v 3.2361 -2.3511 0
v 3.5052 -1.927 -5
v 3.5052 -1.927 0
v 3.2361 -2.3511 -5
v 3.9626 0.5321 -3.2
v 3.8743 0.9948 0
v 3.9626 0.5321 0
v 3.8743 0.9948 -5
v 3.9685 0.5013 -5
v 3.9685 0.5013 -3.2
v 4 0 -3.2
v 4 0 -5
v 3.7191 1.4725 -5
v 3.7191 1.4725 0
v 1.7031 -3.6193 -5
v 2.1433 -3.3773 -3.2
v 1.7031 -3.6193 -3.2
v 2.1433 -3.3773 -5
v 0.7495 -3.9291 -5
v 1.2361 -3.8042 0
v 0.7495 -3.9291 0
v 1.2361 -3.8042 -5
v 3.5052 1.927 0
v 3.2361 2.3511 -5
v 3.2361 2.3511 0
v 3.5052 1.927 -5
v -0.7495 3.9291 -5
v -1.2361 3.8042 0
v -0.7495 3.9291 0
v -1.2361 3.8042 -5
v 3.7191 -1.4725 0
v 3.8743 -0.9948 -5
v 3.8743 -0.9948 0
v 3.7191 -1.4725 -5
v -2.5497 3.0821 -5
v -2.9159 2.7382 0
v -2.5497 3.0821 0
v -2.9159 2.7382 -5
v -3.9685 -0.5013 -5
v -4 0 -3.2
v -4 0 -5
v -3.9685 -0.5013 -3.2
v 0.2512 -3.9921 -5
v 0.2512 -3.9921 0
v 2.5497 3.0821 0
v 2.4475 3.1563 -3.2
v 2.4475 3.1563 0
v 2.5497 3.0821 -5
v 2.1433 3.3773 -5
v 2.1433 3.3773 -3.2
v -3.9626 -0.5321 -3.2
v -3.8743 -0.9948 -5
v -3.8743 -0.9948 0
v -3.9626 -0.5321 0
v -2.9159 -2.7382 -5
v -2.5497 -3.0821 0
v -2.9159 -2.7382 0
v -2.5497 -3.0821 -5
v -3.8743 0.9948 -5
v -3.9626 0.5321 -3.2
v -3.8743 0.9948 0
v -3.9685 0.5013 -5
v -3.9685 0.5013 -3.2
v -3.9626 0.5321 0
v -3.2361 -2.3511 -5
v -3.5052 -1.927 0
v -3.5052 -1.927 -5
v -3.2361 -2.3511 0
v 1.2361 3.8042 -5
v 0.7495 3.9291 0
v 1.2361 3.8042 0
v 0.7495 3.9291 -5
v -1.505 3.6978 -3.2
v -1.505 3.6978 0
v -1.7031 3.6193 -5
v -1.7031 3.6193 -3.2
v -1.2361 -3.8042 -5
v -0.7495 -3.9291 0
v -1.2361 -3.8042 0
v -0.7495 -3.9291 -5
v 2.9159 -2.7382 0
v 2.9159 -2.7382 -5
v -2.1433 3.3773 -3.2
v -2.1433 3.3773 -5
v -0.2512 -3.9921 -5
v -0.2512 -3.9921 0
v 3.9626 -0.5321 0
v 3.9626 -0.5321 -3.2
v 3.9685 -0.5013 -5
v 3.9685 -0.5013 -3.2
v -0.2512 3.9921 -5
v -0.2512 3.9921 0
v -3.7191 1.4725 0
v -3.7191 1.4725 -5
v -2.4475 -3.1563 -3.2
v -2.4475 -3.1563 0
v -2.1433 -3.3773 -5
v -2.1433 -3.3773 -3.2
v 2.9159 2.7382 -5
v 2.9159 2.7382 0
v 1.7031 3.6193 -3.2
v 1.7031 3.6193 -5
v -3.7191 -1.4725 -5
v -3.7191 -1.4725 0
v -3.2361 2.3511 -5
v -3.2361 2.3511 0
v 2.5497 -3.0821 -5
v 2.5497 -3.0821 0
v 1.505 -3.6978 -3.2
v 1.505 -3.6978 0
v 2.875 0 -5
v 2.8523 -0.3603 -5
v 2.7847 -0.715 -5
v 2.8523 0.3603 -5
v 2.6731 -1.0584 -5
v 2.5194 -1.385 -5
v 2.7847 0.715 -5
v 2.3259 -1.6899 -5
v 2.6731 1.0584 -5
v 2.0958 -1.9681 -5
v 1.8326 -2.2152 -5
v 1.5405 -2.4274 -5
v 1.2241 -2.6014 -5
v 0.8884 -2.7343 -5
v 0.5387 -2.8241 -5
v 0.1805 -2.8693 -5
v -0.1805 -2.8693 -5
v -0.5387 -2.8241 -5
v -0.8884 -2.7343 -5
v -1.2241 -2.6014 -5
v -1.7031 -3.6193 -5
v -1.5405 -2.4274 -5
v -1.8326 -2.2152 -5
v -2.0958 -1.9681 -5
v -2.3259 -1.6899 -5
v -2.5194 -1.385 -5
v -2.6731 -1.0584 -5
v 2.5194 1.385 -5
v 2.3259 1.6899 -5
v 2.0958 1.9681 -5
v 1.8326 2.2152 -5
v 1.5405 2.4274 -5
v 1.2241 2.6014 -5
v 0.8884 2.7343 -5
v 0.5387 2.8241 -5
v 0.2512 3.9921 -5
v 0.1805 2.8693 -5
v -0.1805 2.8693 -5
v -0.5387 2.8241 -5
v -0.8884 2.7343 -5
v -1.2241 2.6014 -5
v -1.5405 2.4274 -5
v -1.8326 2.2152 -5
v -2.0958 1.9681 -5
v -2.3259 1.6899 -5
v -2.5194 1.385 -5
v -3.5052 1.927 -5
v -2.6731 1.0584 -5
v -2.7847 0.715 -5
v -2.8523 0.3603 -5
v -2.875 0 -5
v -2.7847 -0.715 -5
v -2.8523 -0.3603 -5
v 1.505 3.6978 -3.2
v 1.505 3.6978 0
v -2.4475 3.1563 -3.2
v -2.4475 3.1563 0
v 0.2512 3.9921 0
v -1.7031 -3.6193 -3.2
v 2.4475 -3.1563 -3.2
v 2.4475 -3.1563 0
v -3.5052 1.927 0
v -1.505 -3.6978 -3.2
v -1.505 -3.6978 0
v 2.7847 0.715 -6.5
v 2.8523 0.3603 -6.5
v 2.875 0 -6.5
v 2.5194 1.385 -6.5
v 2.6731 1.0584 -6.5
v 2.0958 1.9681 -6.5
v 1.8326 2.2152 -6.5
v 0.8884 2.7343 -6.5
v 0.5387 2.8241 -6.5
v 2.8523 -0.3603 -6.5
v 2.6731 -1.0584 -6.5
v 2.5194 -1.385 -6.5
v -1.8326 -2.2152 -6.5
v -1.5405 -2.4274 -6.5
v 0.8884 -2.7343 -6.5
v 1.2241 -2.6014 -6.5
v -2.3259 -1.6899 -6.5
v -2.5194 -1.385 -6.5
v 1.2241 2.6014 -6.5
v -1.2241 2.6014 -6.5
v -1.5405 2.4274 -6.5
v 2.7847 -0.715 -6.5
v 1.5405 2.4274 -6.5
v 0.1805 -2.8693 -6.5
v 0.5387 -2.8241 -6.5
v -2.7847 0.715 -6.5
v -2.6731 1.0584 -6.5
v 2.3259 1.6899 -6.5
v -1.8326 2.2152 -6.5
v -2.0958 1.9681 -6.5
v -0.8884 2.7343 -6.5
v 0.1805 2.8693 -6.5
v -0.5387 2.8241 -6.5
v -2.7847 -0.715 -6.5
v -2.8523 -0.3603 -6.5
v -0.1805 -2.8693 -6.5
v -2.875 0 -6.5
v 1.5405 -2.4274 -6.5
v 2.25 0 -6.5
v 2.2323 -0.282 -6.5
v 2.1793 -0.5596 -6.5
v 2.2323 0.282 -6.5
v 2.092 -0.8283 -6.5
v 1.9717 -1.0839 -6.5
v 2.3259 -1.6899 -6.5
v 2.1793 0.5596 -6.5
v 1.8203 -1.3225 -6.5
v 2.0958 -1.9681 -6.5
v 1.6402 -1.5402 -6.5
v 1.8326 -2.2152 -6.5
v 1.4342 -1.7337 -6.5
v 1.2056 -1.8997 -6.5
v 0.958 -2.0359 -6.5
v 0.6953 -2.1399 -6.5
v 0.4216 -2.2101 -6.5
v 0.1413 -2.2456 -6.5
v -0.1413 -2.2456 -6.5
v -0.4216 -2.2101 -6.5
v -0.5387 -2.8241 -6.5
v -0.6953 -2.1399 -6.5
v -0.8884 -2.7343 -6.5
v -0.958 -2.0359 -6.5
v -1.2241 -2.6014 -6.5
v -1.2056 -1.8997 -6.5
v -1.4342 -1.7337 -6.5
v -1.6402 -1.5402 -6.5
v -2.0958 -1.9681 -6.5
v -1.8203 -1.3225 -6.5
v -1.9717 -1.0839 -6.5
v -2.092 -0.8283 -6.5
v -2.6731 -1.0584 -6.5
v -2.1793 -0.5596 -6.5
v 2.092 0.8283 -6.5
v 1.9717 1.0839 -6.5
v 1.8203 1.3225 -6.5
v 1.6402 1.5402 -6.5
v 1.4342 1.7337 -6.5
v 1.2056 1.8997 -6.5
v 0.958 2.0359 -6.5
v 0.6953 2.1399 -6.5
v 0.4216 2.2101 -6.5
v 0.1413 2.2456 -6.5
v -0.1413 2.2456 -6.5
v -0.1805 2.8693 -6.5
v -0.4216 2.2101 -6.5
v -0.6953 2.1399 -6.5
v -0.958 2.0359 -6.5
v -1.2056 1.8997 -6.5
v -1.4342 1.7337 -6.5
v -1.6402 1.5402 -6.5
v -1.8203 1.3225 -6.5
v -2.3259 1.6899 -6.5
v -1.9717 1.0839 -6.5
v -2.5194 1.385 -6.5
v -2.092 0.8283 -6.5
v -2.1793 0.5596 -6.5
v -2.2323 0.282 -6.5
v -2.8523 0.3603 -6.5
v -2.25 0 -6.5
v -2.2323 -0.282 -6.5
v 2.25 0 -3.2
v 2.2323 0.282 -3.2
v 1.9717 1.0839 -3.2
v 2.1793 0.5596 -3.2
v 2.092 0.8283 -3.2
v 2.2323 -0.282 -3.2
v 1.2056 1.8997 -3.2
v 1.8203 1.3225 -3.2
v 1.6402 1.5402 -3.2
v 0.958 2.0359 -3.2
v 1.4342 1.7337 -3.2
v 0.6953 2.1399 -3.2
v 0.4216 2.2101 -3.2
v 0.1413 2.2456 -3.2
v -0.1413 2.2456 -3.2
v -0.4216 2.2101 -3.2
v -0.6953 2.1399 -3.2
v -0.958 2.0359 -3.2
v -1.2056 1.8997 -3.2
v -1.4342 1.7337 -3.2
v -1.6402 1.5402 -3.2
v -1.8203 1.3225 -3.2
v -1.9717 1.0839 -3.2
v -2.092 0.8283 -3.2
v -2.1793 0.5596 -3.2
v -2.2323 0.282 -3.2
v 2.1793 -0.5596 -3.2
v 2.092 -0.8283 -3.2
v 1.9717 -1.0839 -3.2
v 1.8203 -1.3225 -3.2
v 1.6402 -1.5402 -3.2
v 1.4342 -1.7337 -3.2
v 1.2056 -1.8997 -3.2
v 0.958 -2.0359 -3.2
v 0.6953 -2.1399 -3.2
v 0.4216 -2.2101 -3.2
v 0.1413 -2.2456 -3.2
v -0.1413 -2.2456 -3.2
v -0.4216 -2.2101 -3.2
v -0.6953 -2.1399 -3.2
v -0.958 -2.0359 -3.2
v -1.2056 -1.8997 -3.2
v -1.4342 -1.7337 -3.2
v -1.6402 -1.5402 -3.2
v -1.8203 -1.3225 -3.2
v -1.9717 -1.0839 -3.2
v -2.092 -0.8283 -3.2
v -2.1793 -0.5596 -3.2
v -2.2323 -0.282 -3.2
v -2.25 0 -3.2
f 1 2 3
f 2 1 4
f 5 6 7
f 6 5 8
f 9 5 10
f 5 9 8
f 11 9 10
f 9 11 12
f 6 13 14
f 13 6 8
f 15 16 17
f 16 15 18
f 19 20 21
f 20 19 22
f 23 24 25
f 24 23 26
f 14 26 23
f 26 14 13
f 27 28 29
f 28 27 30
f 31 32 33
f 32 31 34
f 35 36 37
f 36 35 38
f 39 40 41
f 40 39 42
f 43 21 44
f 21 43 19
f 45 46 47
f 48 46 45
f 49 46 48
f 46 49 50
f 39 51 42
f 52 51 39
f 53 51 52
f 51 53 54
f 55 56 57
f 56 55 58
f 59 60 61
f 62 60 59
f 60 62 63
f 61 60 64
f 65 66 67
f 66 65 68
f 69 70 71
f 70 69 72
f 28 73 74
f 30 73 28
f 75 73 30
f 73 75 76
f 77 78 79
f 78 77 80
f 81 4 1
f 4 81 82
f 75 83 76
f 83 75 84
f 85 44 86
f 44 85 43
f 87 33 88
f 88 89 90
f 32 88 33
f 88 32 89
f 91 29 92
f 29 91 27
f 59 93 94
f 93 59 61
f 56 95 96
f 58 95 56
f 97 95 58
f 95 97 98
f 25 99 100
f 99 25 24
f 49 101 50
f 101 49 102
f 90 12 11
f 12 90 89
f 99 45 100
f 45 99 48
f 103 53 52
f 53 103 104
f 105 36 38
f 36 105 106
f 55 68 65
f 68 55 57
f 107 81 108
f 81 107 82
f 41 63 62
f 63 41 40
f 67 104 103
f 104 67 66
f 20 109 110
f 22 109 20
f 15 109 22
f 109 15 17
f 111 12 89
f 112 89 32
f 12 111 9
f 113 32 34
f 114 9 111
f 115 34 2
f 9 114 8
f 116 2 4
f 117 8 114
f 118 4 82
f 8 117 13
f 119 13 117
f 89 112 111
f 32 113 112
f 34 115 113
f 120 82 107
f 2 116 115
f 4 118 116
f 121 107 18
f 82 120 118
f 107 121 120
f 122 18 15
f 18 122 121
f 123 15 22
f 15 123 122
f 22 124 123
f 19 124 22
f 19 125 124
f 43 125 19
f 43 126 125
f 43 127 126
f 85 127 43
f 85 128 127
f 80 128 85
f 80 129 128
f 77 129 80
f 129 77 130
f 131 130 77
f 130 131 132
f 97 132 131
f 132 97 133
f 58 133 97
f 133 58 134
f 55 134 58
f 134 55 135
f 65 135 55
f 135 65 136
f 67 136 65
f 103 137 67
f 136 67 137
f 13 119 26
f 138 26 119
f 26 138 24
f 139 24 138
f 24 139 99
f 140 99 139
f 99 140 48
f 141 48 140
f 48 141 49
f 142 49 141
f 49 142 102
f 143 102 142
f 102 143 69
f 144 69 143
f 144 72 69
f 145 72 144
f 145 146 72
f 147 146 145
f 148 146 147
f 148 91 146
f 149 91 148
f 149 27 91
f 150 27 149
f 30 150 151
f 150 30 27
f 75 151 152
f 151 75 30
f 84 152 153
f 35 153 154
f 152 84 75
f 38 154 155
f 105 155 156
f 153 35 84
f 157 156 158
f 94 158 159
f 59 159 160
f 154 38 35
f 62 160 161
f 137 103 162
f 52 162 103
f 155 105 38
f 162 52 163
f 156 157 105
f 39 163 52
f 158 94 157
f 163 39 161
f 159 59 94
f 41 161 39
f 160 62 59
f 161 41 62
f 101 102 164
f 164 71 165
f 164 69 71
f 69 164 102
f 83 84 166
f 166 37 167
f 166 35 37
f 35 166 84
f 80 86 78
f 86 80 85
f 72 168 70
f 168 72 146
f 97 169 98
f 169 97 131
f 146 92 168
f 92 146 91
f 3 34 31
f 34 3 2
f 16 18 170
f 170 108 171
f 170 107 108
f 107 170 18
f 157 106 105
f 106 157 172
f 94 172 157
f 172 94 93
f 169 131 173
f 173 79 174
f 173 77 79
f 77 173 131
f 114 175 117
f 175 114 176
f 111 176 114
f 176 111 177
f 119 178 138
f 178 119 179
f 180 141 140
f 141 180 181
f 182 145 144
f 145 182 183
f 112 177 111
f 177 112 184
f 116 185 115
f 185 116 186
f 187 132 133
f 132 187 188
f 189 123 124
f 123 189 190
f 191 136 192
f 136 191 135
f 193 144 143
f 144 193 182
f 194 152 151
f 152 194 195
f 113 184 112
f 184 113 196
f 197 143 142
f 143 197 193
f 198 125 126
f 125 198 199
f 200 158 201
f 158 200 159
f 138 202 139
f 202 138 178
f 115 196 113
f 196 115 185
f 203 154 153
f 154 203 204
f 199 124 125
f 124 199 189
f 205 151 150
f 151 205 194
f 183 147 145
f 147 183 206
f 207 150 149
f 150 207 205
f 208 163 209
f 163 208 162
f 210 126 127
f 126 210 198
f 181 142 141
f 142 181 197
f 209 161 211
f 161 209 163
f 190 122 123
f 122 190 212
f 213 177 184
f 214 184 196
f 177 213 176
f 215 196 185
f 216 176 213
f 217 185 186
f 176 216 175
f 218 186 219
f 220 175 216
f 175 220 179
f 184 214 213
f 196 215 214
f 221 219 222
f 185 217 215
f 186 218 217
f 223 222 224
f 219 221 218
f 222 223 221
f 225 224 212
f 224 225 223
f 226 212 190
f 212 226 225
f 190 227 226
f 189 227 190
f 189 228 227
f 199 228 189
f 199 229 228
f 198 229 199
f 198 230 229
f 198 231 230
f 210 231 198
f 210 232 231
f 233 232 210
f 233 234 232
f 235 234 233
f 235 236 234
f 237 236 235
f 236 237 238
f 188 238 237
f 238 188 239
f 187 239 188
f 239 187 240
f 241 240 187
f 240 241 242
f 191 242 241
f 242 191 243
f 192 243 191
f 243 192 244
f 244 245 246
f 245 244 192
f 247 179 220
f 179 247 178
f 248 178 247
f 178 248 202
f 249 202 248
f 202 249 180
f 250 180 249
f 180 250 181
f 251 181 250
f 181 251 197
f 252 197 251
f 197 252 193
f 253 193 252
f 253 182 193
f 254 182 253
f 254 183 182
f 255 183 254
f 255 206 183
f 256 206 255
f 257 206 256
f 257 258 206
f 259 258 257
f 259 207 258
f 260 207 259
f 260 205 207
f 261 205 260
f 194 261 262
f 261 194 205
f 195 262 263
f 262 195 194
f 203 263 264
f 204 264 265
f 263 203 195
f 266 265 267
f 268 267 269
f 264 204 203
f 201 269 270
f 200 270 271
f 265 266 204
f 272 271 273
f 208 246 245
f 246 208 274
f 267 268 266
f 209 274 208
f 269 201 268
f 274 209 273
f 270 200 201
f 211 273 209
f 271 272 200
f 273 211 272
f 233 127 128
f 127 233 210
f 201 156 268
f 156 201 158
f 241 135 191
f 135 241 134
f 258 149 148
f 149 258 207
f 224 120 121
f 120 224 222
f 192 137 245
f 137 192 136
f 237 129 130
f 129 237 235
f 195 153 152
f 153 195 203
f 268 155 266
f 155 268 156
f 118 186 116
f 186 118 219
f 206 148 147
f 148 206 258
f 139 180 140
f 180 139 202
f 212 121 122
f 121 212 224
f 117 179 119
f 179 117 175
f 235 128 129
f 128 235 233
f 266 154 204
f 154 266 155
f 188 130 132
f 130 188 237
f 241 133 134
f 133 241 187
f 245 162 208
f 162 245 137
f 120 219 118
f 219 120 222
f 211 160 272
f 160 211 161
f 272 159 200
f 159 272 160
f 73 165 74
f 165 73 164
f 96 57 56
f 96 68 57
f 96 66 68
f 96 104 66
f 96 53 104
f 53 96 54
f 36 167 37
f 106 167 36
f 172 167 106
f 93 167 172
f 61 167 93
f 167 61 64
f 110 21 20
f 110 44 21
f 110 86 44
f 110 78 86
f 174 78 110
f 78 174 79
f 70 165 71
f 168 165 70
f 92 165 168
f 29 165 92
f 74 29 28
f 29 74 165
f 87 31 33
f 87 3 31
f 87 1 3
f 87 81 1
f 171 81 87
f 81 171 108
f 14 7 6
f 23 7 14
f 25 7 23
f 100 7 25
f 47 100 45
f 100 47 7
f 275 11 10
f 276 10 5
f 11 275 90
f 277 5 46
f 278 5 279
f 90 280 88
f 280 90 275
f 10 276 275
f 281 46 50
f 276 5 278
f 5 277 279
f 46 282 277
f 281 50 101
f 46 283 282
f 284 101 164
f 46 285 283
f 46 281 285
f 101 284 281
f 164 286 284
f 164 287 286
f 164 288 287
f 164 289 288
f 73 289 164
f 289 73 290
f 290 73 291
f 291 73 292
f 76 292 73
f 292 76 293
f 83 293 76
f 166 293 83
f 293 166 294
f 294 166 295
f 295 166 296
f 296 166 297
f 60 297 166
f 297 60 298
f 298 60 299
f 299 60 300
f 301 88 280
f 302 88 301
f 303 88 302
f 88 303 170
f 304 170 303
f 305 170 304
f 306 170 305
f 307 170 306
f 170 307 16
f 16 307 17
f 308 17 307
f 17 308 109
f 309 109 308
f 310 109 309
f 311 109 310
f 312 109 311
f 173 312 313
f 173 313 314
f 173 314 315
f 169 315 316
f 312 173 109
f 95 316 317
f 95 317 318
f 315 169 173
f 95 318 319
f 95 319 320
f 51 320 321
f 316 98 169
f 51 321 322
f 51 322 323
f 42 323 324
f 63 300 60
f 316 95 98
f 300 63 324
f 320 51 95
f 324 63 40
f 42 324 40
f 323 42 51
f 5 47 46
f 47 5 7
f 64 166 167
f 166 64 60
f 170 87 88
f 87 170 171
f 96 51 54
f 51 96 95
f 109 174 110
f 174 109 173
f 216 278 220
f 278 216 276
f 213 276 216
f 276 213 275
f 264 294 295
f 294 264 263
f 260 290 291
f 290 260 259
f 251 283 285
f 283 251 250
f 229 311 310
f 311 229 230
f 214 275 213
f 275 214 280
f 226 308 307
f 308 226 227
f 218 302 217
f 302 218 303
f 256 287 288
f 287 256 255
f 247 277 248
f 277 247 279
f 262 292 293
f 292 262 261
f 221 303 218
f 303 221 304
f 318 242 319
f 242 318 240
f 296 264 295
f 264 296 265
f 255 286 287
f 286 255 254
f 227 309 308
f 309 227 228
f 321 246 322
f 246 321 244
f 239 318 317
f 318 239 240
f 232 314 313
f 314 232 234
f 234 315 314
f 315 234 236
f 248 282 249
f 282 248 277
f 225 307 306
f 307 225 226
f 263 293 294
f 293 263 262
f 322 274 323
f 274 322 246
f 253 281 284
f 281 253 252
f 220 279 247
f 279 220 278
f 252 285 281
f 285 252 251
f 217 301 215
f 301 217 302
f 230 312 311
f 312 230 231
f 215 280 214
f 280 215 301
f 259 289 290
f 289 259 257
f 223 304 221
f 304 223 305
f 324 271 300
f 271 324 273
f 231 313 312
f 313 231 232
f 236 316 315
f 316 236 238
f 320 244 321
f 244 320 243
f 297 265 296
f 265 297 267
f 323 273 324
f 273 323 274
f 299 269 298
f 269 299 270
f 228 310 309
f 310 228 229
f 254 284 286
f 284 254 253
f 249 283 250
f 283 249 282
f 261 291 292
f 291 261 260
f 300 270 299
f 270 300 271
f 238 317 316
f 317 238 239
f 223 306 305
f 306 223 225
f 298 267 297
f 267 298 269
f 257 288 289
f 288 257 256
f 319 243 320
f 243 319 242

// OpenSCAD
$fn = 50;

difference() {
	union() {
		translate(v = [0, 0, -5.0]) {
			cylinder(h = 8.0, r = 4.0);
		}
		#translate(v = [0, 0, -6.5]) {
			cylinder(h = 6.5, r = 2.875);
		}
	}
	union() {
		translate(v = [0, 0, 0]) {
			rotate(a = [0, 0, 0]) {
				difference() {
					union() {
						translate(v = [0, 0, -3.2]) {
							linear_extrude(height = 3.2) {
								polygon(points = [[4.2698, 0.0], [2.1349000000000005, 3.697755269078796], [-2.134899999999999, 3.6977552690787965], [-4.2698, 5.228996902999369e-16], [-2.134900000000002, -3.6977552690787956], [2.1348999999999974, -3.697755269078798]]);
							}
						}
					}
					union();
				}
			}
		}
		#cylinder(h = 3, r = 5.0);
		#translate(v = [0, 0, -100.0]) {
			cylinder(h = 200, r = 2.25);
		}
	}
}
